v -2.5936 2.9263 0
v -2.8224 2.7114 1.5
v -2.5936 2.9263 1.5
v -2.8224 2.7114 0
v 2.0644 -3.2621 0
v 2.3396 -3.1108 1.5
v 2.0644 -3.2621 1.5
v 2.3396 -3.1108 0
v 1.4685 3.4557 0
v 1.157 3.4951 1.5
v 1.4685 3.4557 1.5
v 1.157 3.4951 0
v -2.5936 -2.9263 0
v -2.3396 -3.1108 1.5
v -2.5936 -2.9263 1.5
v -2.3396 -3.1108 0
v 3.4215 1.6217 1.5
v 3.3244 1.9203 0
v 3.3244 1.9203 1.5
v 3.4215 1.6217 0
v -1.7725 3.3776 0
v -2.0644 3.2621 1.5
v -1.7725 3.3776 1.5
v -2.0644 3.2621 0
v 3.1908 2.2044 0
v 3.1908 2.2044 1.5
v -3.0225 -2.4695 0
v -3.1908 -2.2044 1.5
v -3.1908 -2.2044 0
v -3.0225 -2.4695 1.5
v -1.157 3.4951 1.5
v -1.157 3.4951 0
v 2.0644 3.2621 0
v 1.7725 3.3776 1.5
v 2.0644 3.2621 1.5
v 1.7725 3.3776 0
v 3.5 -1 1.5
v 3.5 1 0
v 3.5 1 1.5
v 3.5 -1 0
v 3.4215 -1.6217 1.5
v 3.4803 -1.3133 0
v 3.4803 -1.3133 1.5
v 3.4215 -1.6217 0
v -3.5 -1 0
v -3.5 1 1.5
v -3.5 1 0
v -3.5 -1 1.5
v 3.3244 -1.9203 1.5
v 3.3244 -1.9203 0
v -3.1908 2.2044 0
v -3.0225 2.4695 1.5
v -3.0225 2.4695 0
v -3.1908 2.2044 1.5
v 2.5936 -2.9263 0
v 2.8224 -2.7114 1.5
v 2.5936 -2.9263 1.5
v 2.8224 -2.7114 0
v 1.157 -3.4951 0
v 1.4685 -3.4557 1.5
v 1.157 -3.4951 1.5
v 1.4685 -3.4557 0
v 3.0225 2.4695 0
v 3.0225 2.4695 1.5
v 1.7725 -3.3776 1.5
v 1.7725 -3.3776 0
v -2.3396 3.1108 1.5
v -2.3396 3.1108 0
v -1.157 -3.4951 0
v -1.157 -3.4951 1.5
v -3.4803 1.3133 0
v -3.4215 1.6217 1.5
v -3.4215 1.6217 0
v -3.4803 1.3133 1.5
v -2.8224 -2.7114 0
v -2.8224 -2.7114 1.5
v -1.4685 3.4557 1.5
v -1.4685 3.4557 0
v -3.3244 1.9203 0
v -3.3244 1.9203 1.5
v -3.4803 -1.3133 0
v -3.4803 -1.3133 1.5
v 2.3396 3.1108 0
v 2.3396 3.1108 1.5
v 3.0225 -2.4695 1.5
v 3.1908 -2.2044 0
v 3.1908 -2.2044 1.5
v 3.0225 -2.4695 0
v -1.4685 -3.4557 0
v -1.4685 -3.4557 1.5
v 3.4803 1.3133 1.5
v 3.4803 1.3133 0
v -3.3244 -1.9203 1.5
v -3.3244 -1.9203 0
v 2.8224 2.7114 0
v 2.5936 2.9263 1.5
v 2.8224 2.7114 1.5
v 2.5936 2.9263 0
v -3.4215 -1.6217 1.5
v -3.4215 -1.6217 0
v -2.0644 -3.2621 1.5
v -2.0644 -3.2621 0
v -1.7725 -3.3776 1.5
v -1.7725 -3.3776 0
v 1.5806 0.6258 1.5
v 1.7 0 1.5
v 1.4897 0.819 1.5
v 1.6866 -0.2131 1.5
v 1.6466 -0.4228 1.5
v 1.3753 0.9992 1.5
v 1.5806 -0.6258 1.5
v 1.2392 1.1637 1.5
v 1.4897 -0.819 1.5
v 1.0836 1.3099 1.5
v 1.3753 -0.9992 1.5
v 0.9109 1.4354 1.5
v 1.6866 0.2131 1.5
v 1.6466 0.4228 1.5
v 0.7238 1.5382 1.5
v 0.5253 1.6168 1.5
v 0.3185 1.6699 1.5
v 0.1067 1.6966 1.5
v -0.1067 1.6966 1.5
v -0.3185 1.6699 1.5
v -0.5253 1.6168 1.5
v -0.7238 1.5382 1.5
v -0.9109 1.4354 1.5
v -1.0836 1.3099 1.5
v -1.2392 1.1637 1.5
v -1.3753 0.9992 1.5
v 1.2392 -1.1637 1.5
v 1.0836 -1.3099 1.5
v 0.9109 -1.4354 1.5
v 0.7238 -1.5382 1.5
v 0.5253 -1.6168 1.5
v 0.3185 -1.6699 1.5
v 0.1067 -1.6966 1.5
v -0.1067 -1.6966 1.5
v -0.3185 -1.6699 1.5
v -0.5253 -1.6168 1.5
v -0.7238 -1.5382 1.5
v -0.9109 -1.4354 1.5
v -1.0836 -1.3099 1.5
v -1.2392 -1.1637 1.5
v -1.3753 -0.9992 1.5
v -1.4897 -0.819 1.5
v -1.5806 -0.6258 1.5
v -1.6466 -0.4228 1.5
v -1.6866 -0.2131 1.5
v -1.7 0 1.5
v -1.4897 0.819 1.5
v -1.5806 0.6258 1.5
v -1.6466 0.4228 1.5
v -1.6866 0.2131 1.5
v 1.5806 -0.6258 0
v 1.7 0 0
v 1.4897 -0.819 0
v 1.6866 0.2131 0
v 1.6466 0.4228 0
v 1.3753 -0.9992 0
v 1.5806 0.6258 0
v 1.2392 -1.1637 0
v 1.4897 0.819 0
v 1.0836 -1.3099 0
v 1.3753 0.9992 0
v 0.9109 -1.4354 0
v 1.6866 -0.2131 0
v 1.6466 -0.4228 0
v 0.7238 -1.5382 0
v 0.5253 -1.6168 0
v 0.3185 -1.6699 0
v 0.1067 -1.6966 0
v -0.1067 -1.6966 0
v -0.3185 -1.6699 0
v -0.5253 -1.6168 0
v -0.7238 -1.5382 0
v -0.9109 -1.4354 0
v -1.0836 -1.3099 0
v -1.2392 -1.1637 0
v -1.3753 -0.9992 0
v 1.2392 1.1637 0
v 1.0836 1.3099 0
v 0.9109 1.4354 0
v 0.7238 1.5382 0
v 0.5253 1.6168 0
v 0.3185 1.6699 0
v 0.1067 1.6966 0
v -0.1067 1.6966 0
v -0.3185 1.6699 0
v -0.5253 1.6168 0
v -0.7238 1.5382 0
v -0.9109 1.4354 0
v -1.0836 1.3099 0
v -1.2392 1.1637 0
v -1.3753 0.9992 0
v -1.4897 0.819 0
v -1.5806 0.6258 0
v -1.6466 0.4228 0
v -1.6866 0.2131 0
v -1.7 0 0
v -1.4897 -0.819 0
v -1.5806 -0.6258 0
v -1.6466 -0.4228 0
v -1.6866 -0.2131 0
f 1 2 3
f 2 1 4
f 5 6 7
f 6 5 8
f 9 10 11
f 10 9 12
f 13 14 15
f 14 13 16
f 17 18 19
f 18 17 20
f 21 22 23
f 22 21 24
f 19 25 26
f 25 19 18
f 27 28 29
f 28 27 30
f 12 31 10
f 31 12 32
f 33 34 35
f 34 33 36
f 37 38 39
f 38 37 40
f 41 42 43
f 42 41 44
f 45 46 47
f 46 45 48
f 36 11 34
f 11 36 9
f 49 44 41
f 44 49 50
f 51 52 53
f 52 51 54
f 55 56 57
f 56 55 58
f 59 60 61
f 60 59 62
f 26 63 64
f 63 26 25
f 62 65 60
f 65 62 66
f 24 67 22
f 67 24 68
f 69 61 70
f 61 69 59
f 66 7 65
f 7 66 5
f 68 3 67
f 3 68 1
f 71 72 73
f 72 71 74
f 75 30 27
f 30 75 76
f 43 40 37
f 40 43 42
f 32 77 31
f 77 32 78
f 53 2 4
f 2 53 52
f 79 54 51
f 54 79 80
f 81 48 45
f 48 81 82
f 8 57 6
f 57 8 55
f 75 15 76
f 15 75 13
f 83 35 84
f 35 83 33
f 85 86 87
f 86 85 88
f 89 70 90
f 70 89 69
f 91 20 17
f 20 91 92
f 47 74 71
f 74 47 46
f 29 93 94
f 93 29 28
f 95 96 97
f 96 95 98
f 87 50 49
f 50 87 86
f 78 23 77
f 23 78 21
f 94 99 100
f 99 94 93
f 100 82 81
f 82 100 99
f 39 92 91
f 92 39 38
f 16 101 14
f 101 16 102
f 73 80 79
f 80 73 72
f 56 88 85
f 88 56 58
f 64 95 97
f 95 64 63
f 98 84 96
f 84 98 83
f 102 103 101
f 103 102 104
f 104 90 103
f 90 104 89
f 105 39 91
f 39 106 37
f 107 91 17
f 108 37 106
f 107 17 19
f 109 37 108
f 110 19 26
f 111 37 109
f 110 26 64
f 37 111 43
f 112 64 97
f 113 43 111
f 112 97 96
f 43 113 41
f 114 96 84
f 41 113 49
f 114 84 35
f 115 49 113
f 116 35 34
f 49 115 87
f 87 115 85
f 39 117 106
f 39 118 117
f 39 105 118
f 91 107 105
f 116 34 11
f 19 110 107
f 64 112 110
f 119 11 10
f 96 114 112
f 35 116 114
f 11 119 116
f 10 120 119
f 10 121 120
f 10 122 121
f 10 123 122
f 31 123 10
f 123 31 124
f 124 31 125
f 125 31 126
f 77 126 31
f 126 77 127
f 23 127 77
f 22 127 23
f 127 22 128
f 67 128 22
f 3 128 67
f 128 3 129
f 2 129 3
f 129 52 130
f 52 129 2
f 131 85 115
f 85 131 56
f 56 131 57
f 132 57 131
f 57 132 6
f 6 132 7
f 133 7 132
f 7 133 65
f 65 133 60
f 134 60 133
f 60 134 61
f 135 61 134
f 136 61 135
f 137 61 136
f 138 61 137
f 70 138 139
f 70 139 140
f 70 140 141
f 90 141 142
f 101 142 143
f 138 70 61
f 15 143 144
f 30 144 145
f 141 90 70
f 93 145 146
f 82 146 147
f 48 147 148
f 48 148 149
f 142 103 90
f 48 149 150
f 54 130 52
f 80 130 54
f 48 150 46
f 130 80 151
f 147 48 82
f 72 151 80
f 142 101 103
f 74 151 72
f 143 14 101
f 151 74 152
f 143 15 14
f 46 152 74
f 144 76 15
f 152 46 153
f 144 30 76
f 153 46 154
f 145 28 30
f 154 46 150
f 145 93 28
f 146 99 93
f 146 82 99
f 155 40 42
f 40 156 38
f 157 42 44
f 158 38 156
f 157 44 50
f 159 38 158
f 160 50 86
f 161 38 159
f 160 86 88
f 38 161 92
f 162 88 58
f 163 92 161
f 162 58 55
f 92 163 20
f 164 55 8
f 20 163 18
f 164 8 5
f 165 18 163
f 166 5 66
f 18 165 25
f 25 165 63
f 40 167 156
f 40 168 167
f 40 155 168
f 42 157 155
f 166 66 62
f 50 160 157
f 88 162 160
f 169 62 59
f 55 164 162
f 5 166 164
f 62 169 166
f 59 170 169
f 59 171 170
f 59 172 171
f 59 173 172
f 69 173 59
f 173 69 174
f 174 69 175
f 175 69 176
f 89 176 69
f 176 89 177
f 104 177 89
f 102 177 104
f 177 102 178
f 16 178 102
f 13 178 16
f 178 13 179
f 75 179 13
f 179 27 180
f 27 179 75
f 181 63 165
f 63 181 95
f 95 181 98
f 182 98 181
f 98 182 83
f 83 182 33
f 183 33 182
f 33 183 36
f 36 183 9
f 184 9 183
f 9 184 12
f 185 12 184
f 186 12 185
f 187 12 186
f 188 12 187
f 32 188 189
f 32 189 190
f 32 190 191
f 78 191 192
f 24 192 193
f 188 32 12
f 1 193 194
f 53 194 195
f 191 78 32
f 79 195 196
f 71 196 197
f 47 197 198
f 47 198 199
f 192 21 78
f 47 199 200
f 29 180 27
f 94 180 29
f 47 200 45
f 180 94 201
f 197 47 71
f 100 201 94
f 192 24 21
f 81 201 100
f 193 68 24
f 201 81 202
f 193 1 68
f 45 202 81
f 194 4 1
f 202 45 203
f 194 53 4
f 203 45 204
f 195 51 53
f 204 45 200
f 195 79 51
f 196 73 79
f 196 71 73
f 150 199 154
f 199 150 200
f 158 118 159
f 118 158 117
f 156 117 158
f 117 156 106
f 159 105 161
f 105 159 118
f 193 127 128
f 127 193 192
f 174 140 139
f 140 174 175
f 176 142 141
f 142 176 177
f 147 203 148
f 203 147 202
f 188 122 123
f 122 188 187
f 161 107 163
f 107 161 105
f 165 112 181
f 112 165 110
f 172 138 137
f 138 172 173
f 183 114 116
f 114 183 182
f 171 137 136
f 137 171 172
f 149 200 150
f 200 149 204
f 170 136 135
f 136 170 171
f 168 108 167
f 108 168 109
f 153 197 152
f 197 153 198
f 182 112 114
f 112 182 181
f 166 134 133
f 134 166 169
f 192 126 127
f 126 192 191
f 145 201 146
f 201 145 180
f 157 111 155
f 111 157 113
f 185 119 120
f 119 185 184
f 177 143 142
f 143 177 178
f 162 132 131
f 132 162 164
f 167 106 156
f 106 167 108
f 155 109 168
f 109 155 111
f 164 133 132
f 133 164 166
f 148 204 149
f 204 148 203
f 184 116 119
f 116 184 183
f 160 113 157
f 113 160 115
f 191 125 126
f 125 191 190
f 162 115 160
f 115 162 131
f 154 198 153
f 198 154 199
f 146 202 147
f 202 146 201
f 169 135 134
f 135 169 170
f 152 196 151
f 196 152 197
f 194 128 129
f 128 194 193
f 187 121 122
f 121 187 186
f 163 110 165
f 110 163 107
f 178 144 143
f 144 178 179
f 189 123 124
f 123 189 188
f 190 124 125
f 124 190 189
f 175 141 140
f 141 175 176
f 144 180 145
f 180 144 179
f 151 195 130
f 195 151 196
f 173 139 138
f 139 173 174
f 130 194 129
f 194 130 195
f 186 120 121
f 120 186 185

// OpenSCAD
$fn = 50;


difference() {
	union() {
		translate(v = [0, 0, 0]) {
			rotate(a = [0, 0, 0]) {
				hull() {
					translate(v = [-1.0000000000, 1.0000000000, 0]) {
						rotate(a = [0, 0, 0]) {
							translate(v = [0, 0, 0]) {
								rotate(a = [0, 0, 0]) {
									cylinder(h = 1.5000000000, r = 2.5000000000);
								}
							}
						}
					}
					translate(v = [1.0000000000, 1.0000000000, 0]) {
						rotate(a = [0, 0, 0]) {
							translate(v = [0, 0, 0]) {
								rotate(a = [0, 0, 0]) {
									cylinder(h = 1.5000000000, r = 2.5000000000);
								}
							}
						}
					}
					translate(v = [-1.0000000000, -1.0000000000, 0]) {
						rotate(a = [0, 0, 0]) {
							translate(v = [0, 0, 0]) {
								rotate(a = [0, 0, 0]) {
									cylinder(h = 1.5000000000, r = 2.5000000000);
								}
							}
						}
					}
					translate(v = [1.0000000000, -1.0000000000, 0]) {
						rotate(a = [0, 0, 0]) {
							translate(v = [0, 0, 0]) {
								rotate(a = [0, 0, 0]) {
									cylinder(h = 1.5000000000, r = 2.5000000000);
								}
							}
						}
					}
				}
			}
		}
	}
	union() {
		translate(v = [0.0000000000, 0.0000000000, 0]) {
			rotate(a = [0, 0, 0]) {
				translate(v = [0, 0, -50]) {
					rotate(a = [0, 0, 0]) {
						cylinder(h = 100, r = 1.7000000000);
					}
				}
			}
		}
	}
}
